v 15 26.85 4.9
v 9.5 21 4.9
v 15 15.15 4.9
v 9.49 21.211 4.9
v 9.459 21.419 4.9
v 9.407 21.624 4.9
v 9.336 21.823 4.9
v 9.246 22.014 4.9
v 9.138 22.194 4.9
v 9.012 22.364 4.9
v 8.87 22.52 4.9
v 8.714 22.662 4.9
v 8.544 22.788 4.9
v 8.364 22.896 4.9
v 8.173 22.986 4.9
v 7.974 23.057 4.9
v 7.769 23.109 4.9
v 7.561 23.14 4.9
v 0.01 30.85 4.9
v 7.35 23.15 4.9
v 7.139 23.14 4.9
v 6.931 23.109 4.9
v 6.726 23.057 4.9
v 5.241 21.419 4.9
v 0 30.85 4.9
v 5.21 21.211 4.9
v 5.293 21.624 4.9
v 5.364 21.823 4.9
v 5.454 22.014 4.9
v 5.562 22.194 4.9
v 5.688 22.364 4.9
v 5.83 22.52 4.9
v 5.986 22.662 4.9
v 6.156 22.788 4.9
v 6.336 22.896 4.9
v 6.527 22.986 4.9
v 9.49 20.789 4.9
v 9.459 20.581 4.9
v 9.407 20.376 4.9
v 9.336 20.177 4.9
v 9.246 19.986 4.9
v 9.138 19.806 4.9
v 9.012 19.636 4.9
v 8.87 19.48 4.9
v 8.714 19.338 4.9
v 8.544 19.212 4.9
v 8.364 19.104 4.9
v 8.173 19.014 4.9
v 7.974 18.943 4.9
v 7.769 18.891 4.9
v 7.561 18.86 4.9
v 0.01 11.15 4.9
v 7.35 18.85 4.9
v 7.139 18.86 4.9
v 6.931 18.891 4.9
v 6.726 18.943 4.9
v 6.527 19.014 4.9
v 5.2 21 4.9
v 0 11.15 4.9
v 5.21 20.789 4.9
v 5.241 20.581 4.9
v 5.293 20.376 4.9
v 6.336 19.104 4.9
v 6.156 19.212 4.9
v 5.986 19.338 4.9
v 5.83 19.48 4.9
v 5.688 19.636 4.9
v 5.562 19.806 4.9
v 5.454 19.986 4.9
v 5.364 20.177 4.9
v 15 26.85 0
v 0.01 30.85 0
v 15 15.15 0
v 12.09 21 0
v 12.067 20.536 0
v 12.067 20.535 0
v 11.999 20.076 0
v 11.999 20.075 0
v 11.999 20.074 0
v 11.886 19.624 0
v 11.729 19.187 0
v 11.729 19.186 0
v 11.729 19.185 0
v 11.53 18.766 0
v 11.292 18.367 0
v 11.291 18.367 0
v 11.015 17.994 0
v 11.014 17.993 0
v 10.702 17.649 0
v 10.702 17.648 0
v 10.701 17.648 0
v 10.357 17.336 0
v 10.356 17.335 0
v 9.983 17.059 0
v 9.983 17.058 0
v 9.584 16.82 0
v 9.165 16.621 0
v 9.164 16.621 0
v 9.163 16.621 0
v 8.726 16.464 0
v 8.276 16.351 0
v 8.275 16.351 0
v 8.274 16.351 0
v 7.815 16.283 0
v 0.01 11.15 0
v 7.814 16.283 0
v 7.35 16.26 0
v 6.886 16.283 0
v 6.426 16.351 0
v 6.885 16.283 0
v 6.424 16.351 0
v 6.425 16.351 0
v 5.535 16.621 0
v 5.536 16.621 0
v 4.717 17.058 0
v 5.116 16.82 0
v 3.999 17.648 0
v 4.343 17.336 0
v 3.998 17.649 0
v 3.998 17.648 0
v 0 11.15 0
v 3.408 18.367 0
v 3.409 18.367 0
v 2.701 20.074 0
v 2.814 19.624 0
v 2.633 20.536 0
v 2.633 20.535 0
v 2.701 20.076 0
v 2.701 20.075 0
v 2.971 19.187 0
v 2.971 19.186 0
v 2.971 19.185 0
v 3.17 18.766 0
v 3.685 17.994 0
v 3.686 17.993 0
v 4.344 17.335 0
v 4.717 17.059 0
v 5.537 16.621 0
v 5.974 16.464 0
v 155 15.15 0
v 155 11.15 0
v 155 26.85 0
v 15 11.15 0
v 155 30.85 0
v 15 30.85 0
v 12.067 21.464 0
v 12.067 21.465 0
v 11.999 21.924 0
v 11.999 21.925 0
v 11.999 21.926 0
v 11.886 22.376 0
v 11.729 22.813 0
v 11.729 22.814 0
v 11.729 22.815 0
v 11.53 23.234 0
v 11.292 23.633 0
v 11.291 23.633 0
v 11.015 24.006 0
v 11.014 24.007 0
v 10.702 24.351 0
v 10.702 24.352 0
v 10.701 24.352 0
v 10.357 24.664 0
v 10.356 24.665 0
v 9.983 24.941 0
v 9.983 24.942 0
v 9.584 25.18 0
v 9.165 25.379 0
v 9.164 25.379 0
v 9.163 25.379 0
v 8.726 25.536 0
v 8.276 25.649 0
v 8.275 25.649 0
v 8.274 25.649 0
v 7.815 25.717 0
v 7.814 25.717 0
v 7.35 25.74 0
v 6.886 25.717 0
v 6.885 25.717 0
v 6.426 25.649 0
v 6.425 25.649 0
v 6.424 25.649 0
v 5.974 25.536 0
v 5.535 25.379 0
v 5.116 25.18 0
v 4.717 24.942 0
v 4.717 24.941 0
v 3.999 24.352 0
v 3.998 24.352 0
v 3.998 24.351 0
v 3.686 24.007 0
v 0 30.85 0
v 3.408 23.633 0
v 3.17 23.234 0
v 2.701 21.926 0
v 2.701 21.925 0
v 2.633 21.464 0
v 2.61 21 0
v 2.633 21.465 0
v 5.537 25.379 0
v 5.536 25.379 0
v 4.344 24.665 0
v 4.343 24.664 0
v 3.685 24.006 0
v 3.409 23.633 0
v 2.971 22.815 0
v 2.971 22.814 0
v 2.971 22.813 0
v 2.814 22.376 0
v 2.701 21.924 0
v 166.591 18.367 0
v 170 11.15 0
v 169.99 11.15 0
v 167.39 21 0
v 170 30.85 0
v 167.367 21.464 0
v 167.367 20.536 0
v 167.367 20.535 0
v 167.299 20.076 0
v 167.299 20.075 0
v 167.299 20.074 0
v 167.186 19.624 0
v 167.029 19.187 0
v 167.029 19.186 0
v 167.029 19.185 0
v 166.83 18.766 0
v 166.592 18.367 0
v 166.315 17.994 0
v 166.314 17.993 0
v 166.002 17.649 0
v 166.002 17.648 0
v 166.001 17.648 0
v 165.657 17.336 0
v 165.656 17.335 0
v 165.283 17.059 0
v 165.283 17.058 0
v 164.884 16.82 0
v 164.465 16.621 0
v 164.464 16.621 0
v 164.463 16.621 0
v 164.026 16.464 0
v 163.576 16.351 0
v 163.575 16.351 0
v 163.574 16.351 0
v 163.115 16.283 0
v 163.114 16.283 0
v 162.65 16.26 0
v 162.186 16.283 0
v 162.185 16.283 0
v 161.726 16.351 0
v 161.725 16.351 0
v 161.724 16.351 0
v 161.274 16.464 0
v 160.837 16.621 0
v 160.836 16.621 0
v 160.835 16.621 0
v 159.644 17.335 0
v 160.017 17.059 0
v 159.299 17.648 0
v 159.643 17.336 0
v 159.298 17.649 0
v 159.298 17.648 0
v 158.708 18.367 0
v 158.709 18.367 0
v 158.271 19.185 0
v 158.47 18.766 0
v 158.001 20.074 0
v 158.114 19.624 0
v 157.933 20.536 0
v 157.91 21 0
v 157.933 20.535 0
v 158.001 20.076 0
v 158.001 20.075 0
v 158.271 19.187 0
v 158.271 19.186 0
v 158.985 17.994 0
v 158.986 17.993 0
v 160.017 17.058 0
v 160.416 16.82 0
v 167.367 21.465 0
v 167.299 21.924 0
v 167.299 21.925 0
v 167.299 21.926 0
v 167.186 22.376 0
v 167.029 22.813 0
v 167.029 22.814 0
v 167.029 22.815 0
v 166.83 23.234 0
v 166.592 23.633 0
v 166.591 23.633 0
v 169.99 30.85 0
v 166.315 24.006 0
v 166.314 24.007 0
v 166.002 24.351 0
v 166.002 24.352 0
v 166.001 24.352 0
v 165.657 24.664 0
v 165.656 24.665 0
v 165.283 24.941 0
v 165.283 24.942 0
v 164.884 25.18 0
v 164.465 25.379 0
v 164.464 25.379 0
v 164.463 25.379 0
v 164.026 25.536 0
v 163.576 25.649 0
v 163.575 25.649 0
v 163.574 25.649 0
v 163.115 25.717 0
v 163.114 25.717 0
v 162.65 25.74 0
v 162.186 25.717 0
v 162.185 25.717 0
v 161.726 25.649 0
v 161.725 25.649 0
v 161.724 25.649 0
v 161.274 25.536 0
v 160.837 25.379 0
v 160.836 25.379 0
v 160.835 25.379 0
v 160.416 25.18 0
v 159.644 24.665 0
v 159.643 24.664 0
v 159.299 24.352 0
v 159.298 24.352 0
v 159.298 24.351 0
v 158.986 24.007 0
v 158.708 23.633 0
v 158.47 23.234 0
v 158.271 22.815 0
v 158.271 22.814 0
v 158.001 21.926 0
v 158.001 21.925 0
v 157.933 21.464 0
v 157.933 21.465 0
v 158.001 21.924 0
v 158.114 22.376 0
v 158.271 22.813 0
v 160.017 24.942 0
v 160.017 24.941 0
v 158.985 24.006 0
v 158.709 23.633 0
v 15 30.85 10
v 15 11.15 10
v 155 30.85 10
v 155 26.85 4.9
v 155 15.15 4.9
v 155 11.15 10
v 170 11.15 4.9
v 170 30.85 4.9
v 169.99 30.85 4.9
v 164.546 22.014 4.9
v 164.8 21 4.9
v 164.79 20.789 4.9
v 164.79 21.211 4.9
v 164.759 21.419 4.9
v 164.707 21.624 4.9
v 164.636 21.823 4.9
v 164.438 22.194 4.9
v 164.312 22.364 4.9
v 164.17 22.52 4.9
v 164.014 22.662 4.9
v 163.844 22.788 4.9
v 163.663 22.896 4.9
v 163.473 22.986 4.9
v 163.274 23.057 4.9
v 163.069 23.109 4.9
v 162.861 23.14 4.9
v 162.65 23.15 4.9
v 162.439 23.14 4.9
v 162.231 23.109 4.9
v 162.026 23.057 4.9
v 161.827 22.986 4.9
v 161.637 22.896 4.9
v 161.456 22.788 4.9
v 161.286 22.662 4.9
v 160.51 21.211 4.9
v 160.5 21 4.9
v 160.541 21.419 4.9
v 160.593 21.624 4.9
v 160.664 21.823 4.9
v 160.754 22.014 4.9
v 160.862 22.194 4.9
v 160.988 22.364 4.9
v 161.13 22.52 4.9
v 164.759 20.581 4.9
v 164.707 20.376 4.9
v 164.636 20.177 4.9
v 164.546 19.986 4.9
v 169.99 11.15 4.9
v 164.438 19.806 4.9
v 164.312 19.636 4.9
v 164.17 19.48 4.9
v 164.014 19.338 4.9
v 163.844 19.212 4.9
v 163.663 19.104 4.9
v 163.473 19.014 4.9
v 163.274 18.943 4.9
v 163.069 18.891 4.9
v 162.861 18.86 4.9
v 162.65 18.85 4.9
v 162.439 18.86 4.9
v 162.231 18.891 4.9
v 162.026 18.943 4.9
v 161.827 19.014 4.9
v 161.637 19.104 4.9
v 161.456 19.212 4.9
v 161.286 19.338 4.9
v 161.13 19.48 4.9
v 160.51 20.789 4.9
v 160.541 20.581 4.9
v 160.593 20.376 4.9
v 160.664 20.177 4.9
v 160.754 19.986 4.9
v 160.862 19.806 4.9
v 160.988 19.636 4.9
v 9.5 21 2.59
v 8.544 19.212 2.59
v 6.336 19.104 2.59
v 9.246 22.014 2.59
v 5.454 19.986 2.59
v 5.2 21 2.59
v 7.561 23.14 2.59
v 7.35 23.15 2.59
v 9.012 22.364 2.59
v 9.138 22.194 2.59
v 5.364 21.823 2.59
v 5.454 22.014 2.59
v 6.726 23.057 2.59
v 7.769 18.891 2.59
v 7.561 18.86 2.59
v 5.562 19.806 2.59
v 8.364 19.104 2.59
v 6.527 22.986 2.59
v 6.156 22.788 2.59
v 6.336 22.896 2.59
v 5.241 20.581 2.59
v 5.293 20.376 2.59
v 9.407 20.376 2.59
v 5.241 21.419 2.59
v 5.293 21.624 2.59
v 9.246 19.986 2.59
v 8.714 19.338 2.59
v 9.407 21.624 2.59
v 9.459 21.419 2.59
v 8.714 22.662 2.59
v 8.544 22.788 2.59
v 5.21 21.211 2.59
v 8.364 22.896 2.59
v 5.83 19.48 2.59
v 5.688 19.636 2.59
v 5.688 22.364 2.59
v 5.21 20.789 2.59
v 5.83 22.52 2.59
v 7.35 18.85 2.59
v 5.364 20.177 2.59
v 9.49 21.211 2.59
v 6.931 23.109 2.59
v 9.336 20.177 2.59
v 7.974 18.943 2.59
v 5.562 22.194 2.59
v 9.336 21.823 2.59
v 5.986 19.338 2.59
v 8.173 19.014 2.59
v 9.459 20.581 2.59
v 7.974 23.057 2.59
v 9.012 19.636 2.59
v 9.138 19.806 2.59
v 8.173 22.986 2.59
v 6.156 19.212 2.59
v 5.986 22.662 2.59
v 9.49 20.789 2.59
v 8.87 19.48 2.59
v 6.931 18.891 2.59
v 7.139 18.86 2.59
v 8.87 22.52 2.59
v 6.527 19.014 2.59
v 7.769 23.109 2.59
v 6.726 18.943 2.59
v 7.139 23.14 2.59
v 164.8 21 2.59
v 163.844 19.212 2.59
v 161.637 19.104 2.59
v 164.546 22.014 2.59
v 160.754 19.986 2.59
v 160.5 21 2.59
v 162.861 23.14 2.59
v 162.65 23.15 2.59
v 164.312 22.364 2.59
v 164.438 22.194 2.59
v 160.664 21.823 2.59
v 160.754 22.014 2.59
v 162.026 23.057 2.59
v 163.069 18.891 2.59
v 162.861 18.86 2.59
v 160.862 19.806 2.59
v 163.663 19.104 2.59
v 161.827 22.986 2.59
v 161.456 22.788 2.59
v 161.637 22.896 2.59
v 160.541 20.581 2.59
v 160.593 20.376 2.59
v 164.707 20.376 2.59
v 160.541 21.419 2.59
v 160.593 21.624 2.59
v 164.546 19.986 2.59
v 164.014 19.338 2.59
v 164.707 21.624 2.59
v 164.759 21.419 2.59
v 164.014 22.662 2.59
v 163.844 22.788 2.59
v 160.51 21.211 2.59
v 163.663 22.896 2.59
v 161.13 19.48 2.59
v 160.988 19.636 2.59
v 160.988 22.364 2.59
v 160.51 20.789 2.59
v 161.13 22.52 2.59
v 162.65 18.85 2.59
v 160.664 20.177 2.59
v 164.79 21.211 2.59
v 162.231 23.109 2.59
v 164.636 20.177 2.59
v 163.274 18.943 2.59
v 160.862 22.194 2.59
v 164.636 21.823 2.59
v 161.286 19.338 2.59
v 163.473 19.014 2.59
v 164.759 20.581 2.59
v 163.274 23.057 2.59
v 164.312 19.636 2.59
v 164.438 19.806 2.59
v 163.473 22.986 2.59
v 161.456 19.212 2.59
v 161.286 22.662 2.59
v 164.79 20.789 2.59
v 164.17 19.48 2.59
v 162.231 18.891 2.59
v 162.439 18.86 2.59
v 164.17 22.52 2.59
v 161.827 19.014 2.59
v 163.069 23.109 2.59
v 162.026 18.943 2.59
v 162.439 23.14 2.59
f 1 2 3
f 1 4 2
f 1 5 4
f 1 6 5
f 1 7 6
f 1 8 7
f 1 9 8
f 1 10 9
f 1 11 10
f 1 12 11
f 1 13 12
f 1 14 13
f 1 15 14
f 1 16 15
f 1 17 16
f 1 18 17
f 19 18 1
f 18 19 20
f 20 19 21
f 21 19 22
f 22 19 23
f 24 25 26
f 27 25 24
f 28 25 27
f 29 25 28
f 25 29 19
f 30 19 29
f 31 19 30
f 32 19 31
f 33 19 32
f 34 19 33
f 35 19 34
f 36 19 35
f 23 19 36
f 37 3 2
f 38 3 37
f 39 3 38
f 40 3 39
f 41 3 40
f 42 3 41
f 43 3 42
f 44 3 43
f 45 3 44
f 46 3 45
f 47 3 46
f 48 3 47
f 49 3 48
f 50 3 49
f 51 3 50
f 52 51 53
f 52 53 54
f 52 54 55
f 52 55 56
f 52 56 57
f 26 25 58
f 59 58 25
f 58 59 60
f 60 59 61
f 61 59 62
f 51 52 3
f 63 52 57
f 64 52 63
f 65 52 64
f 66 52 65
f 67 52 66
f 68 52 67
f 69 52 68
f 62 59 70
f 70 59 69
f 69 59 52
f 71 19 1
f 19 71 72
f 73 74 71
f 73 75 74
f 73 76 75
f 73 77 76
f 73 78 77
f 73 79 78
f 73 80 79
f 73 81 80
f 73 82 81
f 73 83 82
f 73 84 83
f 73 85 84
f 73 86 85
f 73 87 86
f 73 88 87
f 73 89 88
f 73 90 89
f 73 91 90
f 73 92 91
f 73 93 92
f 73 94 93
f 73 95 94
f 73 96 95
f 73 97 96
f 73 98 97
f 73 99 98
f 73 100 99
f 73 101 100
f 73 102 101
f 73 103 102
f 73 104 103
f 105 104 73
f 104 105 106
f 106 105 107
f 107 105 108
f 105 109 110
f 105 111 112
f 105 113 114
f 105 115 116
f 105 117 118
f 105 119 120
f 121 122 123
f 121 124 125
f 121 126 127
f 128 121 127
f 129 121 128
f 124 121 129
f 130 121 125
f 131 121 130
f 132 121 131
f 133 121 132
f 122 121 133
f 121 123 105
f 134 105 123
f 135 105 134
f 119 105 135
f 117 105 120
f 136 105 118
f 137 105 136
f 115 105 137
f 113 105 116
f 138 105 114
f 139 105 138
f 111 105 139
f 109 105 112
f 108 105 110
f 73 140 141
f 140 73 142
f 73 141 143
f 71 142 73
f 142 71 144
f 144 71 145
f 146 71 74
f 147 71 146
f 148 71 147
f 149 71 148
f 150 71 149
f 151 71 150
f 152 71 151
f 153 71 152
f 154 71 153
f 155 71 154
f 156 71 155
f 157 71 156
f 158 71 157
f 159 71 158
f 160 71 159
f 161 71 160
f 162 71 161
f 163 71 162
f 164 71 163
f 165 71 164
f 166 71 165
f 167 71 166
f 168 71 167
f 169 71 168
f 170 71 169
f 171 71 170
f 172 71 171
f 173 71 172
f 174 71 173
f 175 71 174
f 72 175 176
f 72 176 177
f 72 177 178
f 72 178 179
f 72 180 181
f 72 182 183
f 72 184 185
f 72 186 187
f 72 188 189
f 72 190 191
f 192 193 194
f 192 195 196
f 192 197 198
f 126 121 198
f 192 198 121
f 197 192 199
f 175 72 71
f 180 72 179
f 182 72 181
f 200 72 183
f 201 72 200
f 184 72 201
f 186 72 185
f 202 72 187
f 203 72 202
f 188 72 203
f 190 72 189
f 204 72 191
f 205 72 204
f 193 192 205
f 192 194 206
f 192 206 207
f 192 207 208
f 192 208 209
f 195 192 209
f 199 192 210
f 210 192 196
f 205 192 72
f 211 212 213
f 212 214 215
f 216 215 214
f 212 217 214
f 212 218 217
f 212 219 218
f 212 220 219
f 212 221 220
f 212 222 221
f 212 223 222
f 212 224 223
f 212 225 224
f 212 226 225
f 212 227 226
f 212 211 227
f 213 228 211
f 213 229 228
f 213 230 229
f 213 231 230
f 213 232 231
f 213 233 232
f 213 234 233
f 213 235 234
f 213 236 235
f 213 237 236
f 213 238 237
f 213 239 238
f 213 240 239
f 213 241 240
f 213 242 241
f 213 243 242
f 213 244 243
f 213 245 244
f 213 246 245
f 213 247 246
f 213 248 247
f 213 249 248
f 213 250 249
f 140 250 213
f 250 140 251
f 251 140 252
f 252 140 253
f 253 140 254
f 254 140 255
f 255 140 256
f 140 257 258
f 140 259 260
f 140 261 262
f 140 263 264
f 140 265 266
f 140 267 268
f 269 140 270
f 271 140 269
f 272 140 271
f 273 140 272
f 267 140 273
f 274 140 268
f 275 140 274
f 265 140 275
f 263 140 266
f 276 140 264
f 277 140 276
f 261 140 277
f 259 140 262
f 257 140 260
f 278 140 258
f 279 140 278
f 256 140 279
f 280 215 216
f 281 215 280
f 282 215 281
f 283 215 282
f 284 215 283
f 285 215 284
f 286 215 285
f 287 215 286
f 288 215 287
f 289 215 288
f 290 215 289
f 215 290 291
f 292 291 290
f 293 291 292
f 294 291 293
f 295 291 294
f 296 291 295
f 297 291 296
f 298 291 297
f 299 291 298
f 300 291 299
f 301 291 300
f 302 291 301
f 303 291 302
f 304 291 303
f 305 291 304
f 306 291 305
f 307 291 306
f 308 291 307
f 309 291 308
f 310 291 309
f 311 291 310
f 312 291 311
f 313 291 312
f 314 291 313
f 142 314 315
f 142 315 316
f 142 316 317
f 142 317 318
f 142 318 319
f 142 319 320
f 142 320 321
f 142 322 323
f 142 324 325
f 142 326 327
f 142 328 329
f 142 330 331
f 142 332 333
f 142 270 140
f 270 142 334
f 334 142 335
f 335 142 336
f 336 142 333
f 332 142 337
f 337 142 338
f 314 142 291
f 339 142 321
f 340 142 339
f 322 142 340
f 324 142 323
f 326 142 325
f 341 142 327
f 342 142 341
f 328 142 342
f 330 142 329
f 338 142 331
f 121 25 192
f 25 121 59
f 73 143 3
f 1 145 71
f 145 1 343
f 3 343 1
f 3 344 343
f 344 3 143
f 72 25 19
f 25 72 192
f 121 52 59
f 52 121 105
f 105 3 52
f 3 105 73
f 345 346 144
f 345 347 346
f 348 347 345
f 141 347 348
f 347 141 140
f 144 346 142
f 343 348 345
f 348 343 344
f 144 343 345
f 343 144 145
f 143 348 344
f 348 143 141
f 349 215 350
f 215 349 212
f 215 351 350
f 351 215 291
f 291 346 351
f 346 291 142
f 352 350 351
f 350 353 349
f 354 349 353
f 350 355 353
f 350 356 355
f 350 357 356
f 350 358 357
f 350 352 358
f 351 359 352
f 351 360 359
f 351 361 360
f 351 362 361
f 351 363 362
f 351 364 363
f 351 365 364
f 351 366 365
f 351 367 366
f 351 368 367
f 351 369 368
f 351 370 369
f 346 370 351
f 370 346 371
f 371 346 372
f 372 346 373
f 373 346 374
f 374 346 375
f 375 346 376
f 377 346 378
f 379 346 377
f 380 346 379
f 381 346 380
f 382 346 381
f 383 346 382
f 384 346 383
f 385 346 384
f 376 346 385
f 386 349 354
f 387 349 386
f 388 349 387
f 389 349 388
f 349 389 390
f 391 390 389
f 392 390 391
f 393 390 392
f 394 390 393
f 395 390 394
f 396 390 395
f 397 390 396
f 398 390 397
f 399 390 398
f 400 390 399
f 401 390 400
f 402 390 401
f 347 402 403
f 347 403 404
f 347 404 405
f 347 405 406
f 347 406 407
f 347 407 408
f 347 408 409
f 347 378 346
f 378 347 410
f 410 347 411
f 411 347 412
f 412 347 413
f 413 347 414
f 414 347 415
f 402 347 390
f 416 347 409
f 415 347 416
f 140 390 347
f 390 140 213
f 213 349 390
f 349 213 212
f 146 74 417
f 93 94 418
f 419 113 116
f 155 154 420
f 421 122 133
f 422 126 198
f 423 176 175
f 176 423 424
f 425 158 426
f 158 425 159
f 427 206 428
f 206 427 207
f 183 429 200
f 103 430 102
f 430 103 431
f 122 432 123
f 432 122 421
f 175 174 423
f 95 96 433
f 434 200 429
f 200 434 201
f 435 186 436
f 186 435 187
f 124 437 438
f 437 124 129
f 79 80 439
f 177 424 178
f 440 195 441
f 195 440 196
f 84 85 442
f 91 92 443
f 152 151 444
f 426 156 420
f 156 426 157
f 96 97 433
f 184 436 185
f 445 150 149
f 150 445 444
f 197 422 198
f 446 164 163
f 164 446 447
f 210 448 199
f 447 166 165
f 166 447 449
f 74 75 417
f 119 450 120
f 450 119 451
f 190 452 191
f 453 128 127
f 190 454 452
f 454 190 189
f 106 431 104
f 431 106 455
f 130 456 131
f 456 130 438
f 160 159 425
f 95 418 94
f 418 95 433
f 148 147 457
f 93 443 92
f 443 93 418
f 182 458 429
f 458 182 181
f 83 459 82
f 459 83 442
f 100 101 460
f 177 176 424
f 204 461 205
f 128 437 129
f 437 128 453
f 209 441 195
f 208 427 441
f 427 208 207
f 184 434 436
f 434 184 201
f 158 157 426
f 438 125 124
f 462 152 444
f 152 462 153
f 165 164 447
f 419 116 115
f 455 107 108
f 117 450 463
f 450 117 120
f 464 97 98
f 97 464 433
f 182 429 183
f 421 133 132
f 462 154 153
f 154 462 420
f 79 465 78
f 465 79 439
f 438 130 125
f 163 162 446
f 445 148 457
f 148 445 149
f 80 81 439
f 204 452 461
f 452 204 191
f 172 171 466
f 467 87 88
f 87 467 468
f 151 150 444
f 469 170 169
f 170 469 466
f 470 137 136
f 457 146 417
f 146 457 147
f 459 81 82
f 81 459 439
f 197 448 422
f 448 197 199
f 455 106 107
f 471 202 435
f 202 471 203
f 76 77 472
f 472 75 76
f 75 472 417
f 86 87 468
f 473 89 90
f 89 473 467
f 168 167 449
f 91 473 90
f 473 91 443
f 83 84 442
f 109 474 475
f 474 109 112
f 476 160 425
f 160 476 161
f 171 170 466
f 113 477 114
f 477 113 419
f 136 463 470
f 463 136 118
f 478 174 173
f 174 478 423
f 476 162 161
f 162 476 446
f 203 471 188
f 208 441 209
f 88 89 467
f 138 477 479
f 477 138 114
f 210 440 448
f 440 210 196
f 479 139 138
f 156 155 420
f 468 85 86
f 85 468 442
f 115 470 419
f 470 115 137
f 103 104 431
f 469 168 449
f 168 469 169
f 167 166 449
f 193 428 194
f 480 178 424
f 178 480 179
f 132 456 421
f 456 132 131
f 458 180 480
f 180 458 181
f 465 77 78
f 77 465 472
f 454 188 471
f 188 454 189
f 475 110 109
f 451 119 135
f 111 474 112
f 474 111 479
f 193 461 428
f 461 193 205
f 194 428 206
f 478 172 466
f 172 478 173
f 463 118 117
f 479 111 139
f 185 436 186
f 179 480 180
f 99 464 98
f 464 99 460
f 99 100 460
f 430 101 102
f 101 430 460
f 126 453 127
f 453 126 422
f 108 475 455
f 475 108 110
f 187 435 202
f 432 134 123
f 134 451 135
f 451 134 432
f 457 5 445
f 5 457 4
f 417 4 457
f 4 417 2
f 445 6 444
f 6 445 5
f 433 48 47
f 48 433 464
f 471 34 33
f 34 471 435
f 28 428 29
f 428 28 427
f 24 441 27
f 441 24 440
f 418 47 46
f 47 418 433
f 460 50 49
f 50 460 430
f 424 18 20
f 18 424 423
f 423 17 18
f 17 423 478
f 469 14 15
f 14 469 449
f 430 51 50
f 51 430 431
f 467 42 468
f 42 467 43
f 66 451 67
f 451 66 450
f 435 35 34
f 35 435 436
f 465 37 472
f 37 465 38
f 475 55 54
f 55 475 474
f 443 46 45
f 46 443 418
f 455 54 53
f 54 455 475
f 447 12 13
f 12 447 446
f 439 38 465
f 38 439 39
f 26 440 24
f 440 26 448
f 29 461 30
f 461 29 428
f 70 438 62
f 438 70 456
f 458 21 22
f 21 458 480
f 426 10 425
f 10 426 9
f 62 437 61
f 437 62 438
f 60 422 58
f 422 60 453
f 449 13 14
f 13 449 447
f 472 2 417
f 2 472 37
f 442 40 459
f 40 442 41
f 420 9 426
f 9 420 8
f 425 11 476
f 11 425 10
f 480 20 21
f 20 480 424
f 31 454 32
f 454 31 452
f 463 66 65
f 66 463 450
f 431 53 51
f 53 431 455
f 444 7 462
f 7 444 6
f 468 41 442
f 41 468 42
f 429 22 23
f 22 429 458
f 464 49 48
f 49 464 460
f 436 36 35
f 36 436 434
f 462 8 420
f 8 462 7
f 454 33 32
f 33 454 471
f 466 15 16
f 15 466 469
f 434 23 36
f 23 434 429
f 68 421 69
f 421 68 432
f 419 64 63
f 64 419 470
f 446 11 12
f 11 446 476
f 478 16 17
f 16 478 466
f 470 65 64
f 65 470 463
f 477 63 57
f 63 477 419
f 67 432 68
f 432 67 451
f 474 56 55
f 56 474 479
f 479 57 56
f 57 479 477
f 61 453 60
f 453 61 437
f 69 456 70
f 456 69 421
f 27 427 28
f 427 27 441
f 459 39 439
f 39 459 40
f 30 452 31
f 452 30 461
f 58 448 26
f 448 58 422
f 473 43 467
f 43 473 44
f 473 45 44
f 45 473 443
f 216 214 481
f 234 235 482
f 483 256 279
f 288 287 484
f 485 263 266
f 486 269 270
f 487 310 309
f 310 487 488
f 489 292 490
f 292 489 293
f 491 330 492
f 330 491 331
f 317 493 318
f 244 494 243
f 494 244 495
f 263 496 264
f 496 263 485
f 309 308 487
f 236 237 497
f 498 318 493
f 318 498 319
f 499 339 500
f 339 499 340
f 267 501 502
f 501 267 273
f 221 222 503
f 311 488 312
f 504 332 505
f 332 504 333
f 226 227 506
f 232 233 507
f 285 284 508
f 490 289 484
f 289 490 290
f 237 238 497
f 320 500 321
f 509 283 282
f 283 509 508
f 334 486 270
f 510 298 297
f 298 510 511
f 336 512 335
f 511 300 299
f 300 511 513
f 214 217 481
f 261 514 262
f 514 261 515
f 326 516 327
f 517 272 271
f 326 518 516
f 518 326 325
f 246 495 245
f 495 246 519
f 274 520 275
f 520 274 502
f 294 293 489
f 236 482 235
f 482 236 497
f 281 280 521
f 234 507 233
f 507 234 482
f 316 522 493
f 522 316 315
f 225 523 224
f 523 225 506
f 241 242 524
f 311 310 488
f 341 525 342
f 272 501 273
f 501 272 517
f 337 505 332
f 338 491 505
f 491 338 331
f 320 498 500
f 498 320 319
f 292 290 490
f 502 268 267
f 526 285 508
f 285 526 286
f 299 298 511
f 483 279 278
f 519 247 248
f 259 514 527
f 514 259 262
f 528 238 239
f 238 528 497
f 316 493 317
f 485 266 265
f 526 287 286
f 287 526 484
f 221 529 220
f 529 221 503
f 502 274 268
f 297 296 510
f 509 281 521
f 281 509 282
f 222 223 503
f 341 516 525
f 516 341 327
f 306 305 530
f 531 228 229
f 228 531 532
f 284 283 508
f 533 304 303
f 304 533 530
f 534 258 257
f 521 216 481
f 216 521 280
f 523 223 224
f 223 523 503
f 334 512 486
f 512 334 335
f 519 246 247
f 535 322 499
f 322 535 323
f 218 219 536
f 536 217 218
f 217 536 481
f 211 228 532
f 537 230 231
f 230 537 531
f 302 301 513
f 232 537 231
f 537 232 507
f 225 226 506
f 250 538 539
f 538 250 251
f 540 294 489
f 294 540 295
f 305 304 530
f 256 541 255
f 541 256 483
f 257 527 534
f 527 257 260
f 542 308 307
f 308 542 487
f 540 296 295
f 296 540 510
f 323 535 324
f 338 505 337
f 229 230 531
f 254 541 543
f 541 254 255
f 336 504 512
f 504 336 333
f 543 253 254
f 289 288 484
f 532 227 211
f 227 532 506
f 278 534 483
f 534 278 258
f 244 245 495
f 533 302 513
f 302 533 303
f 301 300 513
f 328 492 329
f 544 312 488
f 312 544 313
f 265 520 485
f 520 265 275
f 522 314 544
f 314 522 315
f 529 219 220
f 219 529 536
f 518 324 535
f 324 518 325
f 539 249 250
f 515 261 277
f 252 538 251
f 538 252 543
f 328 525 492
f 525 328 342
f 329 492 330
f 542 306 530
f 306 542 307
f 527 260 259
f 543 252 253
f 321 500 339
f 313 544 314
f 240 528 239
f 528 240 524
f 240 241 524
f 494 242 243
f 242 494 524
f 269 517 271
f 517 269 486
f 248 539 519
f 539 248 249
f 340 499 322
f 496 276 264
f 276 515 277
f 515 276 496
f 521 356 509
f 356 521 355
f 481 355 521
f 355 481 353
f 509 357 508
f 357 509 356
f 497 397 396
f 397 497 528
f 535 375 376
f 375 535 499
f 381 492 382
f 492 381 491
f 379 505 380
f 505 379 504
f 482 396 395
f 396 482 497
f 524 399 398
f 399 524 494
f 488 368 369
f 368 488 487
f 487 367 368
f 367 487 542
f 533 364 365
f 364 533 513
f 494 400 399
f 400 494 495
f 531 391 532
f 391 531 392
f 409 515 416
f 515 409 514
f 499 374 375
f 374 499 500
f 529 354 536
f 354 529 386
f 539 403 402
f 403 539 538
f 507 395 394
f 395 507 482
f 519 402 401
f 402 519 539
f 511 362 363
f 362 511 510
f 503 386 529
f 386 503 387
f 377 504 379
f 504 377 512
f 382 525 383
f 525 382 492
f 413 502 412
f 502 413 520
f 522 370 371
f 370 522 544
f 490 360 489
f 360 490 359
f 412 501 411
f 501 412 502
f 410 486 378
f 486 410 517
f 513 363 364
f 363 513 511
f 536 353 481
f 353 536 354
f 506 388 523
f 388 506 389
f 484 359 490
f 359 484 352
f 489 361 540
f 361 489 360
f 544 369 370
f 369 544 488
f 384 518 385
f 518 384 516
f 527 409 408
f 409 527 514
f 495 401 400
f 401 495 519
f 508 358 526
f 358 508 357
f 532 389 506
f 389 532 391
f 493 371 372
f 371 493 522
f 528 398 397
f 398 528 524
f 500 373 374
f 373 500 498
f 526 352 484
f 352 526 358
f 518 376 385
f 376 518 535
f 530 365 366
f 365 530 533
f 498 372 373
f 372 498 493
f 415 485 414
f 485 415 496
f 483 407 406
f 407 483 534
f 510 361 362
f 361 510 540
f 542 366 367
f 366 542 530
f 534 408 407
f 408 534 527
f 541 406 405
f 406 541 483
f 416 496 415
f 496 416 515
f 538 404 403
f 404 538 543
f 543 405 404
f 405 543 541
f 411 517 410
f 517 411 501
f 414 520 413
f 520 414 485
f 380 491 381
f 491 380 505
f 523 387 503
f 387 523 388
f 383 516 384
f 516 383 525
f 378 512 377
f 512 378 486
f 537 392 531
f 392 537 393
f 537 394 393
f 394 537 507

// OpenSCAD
// ============================================================
//  DeskPi RackMate T1 — Horizontal Pole
//  Connects two corner posts horizontally.
//  Dovetail on both ends with countersunk lock screw from bottom.
// ============================================================

/* [★ USER PARAMETERS ★] */
pole_length      = 140.0;  // distance between the two post inner faces (mm) *** MEASURE ***
dovetail_h_left  =  15.0;  // insertion depth of left dovetail into post (mm)
dovetail_h_right =  15.0;  // insertion depth of right dovetail into post (mm)
pole_height      =  10.0;  // vertical thickness of the pole body (mm)
dovetail_height  =  4.9;  // vertical thickness of the dovetail sections (mm)

/* [Lock screw — M4 flat-head, countersunk from bottom] */
lock_d        = 4.3;   // M4 clearance
lock_head_d   = 9.5;   // M4 flat-head diameter
lock_cs_angle = 45;    // half-angle

/* [Dovetail dimensions — must match corner post v9] */
ch_mouth_w   = 12.0;
ch_floor_w   = 20.0;
ch_depth     = 15.0;
ch_clearance =  0.3;

/* [Post reference] */
post_d = 42.0;

$fn = 64;
eps = 0.01;

// ── Derived ──────────────────────────────────────────────────
tm = ch_mouth_w - ch_clearance;
tf = ch_floor_w - ch_clearance;
td = ch_depth   - ch_clearance;
cy = post_d / 2;
total_length = dovetail_h_left + pole_length + dovetail_h_right;

// Lock screw X position: centred in dovetail depth
lock_x_offset = td / 2;  // centred in dovetail depth, matches post receiver hole

// ============================================================
//  MODULE: countersunk hole, oriented along +Z
// ============================================================
module cs_hole(length, hole_d, head_d, cs_angle) {
    cone_h = (head_d/2 - hole_d/2) / tan(cs_angle);
    cylinder(r1=head_d/2, r2=hole_d/2, h=cone_h);
    translate([0, 0, cone_h - eps])
        cylinder(d=hole_d, h=length - cone_h + eps*2);
}

// ============================================================
//  MODULE: single dovetail end
//  Wide at mouth (X=0), narrows to tip (X=depth).
// ============================================================
module dovetail_end(depth) {
    hull() {
        translate([0,         cy - tf/2, 0]) cube([eps, tf, dovetail_height]);
        translate([depth-eps, cy - tm/2, 0]) cube([eps, tm, dovetail_height]);
    }
}

// ============================================================
//  FULL POLE
// ============================================================
difference() {
    union() {
        // Left dovetail
        dovetail_end(dovetail_h_left);

        // Pole body
        translate([dovetail_h_left, cy - tf/2, 0])
            cube([pole_length, tf, pole_height]);

        // Right dovetail
        translate([total_length, 0, 0])
            mirror([1, 0, 0])
                dovetail_end(dovetail_h_right);
    }

    // Lock screw on left dovetail — countersunk from bottom (Z=0)
    translate([lock_x_offset, cy, -eps])
        cs_hole(dovetail_height + eps*2, lock_d, lock_head_d, lock_cs_angle);

    // Lock screw on right dovetail — countersunk from bottom (Z=0)
    translate([total_length - lock_x_offset, cy, -eps])
        cs_hole(dovetail_height + eps*2, lock_d, lock_head_d, lock_cs_angle);
}

// ============================================================
//  PARAMETERS:
//    pole_length      — gap between the two post inner faces (mm)
//    dovetail_h_left  — insertion depth into left post (mm)
//    dovetail_h_right — insertion depth into right post (mm)
//    pole_height      — vertical thickness of pole body (mm)
//    dovetail_height  — vertical thickness of dovetail sections (mm)
//
//  HARDWARE: 2× M3 flat-head screws + nuts (one per dovetail)
//
//  PRINT SETTINGS:
//    PETG or ASA | 4 perimeters | 30% infill
//    Print flat, no supports needed
// ============================================================
